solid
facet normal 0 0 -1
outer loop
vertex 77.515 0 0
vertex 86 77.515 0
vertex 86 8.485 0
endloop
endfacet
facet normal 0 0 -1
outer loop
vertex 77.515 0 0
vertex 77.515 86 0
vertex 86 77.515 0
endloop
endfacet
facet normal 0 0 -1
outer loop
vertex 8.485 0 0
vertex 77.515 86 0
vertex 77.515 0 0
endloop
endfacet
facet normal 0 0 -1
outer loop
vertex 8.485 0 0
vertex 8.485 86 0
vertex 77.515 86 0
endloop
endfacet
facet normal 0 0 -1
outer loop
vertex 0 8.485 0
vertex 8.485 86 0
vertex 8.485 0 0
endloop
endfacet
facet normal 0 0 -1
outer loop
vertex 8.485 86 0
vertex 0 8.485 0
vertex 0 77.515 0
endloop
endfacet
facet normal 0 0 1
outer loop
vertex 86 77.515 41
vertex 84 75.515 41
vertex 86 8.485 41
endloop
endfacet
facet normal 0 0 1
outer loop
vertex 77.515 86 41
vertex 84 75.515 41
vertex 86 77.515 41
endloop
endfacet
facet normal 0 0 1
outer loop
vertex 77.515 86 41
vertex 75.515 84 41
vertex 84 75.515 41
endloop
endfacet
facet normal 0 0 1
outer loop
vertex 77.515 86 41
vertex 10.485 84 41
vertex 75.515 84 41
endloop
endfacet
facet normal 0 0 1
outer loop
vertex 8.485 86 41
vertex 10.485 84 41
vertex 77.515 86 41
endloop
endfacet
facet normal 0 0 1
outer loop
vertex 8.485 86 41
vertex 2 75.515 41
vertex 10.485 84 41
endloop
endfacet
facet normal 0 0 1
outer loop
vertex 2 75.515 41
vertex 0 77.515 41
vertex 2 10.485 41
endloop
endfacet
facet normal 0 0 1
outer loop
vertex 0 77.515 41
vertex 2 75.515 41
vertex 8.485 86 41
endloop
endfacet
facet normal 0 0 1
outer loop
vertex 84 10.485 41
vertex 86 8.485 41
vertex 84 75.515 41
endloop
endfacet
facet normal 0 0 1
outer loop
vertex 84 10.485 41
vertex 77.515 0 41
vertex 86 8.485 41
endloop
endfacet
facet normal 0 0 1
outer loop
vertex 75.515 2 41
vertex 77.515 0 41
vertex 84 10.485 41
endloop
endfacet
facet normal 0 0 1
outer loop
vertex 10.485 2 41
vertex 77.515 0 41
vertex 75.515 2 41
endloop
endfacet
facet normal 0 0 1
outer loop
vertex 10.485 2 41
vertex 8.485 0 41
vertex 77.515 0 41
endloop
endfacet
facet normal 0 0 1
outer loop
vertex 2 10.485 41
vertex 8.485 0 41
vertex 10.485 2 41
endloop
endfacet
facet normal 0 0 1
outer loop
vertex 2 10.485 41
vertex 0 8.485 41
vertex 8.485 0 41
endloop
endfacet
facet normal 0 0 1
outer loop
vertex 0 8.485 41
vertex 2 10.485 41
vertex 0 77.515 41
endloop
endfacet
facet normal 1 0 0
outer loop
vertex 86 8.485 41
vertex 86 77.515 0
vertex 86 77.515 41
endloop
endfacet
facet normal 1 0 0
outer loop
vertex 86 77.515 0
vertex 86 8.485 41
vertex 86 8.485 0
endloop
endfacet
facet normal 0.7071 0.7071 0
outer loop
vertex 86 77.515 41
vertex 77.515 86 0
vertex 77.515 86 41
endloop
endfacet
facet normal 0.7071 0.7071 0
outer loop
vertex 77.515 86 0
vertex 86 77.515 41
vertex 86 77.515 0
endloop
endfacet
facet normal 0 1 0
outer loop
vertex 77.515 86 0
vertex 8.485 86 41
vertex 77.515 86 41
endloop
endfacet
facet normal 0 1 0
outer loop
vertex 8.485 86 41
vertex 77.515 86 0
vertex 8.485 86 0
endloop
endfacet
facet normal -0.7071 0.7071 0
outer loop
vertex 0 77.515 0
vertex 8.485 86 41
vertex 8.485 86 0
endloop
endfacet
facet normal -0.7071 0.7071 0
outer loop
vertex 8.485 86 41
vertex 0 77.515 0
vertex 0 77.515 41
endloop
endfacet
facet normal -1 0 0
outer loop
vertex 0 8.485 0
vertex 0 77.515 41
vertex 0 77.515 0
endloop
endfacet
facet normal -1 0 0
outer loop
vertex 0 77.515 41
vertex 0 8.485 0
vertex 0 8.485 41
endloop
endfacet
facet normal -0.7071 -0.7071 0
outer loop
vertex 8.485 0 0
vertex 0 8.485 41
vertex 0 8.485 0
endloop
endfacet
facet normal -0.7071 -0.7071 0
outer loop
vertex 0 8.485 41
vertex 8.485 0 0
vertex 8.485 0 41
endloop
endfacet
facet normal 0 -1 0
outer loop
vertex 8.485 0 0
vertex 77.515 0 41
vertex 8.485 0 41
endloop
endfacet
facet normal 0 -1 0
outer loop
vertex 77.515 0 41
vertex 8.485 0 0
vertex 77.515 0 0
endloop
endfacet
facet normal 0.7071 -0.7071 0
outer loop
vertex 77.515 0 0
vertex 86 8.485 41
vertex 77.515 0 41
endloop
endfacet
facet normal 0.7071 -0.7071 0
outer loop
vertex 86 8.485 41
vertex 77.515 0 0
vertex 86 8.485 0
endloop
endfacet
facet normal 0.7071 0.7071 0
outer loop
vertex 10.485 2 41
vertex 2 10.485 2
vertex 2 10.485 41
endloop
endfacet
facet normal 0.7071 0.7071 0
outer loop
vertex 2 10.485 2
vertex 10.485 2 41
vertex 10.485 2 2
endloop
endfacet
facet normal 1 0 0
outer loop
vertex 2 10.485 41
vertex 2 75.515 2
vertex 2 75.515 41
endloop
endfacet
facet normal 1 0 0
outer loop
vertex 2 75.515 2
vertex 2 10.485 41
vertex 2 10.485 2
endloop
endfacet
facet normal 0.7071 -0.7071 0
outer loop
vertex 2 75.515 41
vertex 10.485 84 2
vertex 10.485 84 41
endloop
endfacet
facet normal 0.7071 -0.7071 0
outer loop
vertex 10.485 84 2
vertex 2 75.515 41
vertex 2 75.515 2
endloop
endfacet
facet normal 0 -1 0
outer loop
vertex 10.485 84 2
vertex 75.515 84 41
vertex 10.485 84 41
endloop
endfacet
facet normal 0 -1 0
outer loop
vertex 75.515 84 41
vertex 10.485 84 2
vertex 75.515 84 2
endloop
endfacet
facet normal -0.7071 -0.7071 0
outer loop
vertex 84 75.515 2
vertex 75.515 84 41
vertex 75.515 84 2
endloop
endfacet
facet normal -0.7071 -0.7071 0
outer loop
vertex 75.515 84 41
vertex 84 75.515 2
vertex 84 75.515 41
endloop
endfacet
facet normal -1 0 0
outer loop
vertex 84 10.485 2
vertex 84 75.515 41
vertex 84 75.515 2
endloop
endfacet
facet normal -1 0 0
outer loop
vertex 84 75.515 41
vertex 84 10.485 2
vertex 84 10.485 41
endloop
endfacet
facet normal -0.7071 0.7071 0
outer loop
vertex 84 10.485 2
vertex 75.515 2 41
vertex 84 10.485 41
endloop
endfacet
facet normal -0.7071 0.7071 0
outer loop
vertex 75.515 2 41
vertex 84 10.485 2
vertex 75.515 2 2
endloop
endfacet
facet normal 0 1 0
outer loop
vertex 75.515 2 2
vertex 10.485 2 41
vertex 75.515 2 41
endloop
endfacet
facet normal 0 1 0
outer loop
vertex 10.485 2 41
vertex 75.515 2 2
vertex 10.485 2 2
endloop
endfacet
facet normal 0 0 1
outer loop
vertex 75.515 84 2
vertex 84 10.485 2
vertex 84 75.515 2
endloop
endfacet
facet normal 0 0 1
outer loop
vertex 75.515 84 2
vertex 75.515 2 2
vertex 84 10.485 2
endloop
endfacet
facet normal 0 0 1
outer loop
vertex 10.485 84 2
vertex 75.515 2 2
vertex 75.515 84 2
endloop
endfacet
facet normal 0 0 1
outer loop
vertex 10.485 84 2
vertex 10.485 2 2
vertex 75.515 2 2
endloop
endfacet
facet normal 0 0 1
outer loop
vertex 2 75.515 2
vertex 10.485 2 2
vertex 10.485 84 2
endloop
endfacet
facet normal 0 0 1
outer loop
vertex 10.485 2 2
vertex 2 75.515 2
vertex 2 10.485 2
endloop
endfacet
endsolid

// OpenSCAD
// The length of the individual bin/tray.
$length = 86;

// The depth (width really) of the bin/tray.
$depth = 86;

// The height as a percentage of the total available depth of the bin it will be inserted into.
$heightPct = 50; // [20:100]

// The thickness of the outter walls.
$wallThickness = 2; // [2:10]

// The thickness of the bottom.
$bottomThickness = 2; // [2:10]

// The chamfer size on the left side of the box.
$leftChamfer = 12; // [0:14]

// The chamfer size on the right side of the box.
$rightChamfer = 12; // [0:14]

{} // Below this are not customizable parameters

generateTrayPct($length, $depth, $heightPct, $wallThickness, $bottomThickness, $leftChamfer, $rightChamfer);

module generateTrayPct(length, depth, heightPct, wallThickness, bottomThickness, leftChamfer, rightChamfer) {
    $height = 82 * heightPct * 0.01;
    generateTray(length, depth, $height, wallThickness, bottomThickness, leftChamfer, rightChamfer);
}

module generateTray(length, depth, height, wallThickness, bottomThickness, leftChamfer, rightChamfer) {
    $leftChamferTriangleSide = sqrt(pow(leftChamfer,2)/2);
    $rightChamferTriangleSide = sqrt(pow(rightChamfer,2)/2);

    // Outer polygon
    outer_points = [
        [$leftChamferTriangleSide,0], 
        [length-$rightChamferTriangleSide,0], 
        [length, $rightChamferTriangleSide],
        [length, depth-$rightChamferTriangleSide],
        [length - $rightChamferTriangleSide, depth],
        [$leftChamferTriangleSide,depth],
        [0,depth-$leftChamferTriangleSide],
        [0, $leftChamferTriangleSide]
    ];

    // Inner polygon
    inner_points = [
        [$leftChamferTriangleSide + wallThickness, wallThickness], 
        [length - $rightChamferTriangleSide - wallThickness, wallThickness], 
        [length - wallThickness, $rightChamferTriangleSide + wallThickness],
        [length - wallThickness, depth - $rightChamferTriangleSide - wallThickness],
        [length - $rightChamferTriangleSide - wallThickness, depth - wallThickness],
        [$leftChamferTriangleSide + wallThickness, depth - wallThickness],
        [wallThickness, depth - $leftChamferTriangleSide - wallThickness],
        [wallThickness, $leftChamferTriangleSide + wallThickness]
    ];

    // Create the hollow shape and extrude it
    color("green")
    linear_extrude(height = height)
    difference() {
            polygon(points = outer_points);
            polygon(points = inner_points);
    }

    // Add a solid base
    color("red")
    linear_extrude(height = bottomThickness)
    polygon(points = outer_points);
}
